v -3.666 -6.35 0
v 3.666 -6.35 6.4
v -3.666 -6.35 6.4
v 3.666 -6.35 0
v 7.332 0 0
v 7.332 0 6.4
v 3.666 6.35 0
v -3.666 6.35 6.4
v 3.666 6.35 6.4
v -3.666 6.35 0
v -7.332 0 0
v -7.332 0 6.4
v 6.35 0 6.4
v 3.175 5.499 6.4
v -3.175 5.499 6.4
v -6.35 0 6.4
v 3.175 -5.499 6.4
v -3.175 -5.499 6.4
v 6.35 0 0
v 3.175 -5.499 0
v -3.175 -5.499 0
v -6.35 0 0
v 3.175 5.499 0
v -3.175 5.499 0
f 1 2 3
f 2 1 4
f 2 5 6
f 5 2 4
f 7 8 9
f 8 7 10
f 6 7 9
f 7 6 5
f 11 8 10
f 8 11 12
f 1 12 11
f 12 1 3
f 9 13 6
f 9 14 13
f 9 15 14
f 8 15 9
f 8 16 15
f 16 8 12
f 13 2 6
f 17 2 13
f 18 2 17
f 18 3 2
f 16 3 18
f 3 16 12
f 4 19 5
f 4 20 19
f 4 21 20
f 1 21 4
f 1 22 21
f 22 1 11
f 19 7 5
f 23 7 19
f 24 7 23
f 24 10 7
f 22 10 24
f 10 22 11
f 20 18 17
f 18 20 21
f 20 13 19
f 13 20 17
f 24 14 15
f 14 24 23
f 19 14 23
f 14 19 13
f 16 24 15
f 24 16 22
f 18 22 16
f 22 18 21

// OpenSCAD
nut_diameter = 12.7;
nut_height = 6.4;
thread_depth = 1.6;
$fn = 100;

module m10_hex_nut() {
    difference() {
        // Hex body
        cylinder(r = nut_diameter / sqrt(3), h = nut_height, $fn = 6);
        
        // Hex hole
        cylinder(r = nut_diameter / sqrt(3) - thread_depth, h = nut_height, $fn = 6);
        
        // Hex flange
        cylinder(r = nut_diameter / 2, h = nut_height, $fn = 6);
    }
}

m10_hex_nut();
